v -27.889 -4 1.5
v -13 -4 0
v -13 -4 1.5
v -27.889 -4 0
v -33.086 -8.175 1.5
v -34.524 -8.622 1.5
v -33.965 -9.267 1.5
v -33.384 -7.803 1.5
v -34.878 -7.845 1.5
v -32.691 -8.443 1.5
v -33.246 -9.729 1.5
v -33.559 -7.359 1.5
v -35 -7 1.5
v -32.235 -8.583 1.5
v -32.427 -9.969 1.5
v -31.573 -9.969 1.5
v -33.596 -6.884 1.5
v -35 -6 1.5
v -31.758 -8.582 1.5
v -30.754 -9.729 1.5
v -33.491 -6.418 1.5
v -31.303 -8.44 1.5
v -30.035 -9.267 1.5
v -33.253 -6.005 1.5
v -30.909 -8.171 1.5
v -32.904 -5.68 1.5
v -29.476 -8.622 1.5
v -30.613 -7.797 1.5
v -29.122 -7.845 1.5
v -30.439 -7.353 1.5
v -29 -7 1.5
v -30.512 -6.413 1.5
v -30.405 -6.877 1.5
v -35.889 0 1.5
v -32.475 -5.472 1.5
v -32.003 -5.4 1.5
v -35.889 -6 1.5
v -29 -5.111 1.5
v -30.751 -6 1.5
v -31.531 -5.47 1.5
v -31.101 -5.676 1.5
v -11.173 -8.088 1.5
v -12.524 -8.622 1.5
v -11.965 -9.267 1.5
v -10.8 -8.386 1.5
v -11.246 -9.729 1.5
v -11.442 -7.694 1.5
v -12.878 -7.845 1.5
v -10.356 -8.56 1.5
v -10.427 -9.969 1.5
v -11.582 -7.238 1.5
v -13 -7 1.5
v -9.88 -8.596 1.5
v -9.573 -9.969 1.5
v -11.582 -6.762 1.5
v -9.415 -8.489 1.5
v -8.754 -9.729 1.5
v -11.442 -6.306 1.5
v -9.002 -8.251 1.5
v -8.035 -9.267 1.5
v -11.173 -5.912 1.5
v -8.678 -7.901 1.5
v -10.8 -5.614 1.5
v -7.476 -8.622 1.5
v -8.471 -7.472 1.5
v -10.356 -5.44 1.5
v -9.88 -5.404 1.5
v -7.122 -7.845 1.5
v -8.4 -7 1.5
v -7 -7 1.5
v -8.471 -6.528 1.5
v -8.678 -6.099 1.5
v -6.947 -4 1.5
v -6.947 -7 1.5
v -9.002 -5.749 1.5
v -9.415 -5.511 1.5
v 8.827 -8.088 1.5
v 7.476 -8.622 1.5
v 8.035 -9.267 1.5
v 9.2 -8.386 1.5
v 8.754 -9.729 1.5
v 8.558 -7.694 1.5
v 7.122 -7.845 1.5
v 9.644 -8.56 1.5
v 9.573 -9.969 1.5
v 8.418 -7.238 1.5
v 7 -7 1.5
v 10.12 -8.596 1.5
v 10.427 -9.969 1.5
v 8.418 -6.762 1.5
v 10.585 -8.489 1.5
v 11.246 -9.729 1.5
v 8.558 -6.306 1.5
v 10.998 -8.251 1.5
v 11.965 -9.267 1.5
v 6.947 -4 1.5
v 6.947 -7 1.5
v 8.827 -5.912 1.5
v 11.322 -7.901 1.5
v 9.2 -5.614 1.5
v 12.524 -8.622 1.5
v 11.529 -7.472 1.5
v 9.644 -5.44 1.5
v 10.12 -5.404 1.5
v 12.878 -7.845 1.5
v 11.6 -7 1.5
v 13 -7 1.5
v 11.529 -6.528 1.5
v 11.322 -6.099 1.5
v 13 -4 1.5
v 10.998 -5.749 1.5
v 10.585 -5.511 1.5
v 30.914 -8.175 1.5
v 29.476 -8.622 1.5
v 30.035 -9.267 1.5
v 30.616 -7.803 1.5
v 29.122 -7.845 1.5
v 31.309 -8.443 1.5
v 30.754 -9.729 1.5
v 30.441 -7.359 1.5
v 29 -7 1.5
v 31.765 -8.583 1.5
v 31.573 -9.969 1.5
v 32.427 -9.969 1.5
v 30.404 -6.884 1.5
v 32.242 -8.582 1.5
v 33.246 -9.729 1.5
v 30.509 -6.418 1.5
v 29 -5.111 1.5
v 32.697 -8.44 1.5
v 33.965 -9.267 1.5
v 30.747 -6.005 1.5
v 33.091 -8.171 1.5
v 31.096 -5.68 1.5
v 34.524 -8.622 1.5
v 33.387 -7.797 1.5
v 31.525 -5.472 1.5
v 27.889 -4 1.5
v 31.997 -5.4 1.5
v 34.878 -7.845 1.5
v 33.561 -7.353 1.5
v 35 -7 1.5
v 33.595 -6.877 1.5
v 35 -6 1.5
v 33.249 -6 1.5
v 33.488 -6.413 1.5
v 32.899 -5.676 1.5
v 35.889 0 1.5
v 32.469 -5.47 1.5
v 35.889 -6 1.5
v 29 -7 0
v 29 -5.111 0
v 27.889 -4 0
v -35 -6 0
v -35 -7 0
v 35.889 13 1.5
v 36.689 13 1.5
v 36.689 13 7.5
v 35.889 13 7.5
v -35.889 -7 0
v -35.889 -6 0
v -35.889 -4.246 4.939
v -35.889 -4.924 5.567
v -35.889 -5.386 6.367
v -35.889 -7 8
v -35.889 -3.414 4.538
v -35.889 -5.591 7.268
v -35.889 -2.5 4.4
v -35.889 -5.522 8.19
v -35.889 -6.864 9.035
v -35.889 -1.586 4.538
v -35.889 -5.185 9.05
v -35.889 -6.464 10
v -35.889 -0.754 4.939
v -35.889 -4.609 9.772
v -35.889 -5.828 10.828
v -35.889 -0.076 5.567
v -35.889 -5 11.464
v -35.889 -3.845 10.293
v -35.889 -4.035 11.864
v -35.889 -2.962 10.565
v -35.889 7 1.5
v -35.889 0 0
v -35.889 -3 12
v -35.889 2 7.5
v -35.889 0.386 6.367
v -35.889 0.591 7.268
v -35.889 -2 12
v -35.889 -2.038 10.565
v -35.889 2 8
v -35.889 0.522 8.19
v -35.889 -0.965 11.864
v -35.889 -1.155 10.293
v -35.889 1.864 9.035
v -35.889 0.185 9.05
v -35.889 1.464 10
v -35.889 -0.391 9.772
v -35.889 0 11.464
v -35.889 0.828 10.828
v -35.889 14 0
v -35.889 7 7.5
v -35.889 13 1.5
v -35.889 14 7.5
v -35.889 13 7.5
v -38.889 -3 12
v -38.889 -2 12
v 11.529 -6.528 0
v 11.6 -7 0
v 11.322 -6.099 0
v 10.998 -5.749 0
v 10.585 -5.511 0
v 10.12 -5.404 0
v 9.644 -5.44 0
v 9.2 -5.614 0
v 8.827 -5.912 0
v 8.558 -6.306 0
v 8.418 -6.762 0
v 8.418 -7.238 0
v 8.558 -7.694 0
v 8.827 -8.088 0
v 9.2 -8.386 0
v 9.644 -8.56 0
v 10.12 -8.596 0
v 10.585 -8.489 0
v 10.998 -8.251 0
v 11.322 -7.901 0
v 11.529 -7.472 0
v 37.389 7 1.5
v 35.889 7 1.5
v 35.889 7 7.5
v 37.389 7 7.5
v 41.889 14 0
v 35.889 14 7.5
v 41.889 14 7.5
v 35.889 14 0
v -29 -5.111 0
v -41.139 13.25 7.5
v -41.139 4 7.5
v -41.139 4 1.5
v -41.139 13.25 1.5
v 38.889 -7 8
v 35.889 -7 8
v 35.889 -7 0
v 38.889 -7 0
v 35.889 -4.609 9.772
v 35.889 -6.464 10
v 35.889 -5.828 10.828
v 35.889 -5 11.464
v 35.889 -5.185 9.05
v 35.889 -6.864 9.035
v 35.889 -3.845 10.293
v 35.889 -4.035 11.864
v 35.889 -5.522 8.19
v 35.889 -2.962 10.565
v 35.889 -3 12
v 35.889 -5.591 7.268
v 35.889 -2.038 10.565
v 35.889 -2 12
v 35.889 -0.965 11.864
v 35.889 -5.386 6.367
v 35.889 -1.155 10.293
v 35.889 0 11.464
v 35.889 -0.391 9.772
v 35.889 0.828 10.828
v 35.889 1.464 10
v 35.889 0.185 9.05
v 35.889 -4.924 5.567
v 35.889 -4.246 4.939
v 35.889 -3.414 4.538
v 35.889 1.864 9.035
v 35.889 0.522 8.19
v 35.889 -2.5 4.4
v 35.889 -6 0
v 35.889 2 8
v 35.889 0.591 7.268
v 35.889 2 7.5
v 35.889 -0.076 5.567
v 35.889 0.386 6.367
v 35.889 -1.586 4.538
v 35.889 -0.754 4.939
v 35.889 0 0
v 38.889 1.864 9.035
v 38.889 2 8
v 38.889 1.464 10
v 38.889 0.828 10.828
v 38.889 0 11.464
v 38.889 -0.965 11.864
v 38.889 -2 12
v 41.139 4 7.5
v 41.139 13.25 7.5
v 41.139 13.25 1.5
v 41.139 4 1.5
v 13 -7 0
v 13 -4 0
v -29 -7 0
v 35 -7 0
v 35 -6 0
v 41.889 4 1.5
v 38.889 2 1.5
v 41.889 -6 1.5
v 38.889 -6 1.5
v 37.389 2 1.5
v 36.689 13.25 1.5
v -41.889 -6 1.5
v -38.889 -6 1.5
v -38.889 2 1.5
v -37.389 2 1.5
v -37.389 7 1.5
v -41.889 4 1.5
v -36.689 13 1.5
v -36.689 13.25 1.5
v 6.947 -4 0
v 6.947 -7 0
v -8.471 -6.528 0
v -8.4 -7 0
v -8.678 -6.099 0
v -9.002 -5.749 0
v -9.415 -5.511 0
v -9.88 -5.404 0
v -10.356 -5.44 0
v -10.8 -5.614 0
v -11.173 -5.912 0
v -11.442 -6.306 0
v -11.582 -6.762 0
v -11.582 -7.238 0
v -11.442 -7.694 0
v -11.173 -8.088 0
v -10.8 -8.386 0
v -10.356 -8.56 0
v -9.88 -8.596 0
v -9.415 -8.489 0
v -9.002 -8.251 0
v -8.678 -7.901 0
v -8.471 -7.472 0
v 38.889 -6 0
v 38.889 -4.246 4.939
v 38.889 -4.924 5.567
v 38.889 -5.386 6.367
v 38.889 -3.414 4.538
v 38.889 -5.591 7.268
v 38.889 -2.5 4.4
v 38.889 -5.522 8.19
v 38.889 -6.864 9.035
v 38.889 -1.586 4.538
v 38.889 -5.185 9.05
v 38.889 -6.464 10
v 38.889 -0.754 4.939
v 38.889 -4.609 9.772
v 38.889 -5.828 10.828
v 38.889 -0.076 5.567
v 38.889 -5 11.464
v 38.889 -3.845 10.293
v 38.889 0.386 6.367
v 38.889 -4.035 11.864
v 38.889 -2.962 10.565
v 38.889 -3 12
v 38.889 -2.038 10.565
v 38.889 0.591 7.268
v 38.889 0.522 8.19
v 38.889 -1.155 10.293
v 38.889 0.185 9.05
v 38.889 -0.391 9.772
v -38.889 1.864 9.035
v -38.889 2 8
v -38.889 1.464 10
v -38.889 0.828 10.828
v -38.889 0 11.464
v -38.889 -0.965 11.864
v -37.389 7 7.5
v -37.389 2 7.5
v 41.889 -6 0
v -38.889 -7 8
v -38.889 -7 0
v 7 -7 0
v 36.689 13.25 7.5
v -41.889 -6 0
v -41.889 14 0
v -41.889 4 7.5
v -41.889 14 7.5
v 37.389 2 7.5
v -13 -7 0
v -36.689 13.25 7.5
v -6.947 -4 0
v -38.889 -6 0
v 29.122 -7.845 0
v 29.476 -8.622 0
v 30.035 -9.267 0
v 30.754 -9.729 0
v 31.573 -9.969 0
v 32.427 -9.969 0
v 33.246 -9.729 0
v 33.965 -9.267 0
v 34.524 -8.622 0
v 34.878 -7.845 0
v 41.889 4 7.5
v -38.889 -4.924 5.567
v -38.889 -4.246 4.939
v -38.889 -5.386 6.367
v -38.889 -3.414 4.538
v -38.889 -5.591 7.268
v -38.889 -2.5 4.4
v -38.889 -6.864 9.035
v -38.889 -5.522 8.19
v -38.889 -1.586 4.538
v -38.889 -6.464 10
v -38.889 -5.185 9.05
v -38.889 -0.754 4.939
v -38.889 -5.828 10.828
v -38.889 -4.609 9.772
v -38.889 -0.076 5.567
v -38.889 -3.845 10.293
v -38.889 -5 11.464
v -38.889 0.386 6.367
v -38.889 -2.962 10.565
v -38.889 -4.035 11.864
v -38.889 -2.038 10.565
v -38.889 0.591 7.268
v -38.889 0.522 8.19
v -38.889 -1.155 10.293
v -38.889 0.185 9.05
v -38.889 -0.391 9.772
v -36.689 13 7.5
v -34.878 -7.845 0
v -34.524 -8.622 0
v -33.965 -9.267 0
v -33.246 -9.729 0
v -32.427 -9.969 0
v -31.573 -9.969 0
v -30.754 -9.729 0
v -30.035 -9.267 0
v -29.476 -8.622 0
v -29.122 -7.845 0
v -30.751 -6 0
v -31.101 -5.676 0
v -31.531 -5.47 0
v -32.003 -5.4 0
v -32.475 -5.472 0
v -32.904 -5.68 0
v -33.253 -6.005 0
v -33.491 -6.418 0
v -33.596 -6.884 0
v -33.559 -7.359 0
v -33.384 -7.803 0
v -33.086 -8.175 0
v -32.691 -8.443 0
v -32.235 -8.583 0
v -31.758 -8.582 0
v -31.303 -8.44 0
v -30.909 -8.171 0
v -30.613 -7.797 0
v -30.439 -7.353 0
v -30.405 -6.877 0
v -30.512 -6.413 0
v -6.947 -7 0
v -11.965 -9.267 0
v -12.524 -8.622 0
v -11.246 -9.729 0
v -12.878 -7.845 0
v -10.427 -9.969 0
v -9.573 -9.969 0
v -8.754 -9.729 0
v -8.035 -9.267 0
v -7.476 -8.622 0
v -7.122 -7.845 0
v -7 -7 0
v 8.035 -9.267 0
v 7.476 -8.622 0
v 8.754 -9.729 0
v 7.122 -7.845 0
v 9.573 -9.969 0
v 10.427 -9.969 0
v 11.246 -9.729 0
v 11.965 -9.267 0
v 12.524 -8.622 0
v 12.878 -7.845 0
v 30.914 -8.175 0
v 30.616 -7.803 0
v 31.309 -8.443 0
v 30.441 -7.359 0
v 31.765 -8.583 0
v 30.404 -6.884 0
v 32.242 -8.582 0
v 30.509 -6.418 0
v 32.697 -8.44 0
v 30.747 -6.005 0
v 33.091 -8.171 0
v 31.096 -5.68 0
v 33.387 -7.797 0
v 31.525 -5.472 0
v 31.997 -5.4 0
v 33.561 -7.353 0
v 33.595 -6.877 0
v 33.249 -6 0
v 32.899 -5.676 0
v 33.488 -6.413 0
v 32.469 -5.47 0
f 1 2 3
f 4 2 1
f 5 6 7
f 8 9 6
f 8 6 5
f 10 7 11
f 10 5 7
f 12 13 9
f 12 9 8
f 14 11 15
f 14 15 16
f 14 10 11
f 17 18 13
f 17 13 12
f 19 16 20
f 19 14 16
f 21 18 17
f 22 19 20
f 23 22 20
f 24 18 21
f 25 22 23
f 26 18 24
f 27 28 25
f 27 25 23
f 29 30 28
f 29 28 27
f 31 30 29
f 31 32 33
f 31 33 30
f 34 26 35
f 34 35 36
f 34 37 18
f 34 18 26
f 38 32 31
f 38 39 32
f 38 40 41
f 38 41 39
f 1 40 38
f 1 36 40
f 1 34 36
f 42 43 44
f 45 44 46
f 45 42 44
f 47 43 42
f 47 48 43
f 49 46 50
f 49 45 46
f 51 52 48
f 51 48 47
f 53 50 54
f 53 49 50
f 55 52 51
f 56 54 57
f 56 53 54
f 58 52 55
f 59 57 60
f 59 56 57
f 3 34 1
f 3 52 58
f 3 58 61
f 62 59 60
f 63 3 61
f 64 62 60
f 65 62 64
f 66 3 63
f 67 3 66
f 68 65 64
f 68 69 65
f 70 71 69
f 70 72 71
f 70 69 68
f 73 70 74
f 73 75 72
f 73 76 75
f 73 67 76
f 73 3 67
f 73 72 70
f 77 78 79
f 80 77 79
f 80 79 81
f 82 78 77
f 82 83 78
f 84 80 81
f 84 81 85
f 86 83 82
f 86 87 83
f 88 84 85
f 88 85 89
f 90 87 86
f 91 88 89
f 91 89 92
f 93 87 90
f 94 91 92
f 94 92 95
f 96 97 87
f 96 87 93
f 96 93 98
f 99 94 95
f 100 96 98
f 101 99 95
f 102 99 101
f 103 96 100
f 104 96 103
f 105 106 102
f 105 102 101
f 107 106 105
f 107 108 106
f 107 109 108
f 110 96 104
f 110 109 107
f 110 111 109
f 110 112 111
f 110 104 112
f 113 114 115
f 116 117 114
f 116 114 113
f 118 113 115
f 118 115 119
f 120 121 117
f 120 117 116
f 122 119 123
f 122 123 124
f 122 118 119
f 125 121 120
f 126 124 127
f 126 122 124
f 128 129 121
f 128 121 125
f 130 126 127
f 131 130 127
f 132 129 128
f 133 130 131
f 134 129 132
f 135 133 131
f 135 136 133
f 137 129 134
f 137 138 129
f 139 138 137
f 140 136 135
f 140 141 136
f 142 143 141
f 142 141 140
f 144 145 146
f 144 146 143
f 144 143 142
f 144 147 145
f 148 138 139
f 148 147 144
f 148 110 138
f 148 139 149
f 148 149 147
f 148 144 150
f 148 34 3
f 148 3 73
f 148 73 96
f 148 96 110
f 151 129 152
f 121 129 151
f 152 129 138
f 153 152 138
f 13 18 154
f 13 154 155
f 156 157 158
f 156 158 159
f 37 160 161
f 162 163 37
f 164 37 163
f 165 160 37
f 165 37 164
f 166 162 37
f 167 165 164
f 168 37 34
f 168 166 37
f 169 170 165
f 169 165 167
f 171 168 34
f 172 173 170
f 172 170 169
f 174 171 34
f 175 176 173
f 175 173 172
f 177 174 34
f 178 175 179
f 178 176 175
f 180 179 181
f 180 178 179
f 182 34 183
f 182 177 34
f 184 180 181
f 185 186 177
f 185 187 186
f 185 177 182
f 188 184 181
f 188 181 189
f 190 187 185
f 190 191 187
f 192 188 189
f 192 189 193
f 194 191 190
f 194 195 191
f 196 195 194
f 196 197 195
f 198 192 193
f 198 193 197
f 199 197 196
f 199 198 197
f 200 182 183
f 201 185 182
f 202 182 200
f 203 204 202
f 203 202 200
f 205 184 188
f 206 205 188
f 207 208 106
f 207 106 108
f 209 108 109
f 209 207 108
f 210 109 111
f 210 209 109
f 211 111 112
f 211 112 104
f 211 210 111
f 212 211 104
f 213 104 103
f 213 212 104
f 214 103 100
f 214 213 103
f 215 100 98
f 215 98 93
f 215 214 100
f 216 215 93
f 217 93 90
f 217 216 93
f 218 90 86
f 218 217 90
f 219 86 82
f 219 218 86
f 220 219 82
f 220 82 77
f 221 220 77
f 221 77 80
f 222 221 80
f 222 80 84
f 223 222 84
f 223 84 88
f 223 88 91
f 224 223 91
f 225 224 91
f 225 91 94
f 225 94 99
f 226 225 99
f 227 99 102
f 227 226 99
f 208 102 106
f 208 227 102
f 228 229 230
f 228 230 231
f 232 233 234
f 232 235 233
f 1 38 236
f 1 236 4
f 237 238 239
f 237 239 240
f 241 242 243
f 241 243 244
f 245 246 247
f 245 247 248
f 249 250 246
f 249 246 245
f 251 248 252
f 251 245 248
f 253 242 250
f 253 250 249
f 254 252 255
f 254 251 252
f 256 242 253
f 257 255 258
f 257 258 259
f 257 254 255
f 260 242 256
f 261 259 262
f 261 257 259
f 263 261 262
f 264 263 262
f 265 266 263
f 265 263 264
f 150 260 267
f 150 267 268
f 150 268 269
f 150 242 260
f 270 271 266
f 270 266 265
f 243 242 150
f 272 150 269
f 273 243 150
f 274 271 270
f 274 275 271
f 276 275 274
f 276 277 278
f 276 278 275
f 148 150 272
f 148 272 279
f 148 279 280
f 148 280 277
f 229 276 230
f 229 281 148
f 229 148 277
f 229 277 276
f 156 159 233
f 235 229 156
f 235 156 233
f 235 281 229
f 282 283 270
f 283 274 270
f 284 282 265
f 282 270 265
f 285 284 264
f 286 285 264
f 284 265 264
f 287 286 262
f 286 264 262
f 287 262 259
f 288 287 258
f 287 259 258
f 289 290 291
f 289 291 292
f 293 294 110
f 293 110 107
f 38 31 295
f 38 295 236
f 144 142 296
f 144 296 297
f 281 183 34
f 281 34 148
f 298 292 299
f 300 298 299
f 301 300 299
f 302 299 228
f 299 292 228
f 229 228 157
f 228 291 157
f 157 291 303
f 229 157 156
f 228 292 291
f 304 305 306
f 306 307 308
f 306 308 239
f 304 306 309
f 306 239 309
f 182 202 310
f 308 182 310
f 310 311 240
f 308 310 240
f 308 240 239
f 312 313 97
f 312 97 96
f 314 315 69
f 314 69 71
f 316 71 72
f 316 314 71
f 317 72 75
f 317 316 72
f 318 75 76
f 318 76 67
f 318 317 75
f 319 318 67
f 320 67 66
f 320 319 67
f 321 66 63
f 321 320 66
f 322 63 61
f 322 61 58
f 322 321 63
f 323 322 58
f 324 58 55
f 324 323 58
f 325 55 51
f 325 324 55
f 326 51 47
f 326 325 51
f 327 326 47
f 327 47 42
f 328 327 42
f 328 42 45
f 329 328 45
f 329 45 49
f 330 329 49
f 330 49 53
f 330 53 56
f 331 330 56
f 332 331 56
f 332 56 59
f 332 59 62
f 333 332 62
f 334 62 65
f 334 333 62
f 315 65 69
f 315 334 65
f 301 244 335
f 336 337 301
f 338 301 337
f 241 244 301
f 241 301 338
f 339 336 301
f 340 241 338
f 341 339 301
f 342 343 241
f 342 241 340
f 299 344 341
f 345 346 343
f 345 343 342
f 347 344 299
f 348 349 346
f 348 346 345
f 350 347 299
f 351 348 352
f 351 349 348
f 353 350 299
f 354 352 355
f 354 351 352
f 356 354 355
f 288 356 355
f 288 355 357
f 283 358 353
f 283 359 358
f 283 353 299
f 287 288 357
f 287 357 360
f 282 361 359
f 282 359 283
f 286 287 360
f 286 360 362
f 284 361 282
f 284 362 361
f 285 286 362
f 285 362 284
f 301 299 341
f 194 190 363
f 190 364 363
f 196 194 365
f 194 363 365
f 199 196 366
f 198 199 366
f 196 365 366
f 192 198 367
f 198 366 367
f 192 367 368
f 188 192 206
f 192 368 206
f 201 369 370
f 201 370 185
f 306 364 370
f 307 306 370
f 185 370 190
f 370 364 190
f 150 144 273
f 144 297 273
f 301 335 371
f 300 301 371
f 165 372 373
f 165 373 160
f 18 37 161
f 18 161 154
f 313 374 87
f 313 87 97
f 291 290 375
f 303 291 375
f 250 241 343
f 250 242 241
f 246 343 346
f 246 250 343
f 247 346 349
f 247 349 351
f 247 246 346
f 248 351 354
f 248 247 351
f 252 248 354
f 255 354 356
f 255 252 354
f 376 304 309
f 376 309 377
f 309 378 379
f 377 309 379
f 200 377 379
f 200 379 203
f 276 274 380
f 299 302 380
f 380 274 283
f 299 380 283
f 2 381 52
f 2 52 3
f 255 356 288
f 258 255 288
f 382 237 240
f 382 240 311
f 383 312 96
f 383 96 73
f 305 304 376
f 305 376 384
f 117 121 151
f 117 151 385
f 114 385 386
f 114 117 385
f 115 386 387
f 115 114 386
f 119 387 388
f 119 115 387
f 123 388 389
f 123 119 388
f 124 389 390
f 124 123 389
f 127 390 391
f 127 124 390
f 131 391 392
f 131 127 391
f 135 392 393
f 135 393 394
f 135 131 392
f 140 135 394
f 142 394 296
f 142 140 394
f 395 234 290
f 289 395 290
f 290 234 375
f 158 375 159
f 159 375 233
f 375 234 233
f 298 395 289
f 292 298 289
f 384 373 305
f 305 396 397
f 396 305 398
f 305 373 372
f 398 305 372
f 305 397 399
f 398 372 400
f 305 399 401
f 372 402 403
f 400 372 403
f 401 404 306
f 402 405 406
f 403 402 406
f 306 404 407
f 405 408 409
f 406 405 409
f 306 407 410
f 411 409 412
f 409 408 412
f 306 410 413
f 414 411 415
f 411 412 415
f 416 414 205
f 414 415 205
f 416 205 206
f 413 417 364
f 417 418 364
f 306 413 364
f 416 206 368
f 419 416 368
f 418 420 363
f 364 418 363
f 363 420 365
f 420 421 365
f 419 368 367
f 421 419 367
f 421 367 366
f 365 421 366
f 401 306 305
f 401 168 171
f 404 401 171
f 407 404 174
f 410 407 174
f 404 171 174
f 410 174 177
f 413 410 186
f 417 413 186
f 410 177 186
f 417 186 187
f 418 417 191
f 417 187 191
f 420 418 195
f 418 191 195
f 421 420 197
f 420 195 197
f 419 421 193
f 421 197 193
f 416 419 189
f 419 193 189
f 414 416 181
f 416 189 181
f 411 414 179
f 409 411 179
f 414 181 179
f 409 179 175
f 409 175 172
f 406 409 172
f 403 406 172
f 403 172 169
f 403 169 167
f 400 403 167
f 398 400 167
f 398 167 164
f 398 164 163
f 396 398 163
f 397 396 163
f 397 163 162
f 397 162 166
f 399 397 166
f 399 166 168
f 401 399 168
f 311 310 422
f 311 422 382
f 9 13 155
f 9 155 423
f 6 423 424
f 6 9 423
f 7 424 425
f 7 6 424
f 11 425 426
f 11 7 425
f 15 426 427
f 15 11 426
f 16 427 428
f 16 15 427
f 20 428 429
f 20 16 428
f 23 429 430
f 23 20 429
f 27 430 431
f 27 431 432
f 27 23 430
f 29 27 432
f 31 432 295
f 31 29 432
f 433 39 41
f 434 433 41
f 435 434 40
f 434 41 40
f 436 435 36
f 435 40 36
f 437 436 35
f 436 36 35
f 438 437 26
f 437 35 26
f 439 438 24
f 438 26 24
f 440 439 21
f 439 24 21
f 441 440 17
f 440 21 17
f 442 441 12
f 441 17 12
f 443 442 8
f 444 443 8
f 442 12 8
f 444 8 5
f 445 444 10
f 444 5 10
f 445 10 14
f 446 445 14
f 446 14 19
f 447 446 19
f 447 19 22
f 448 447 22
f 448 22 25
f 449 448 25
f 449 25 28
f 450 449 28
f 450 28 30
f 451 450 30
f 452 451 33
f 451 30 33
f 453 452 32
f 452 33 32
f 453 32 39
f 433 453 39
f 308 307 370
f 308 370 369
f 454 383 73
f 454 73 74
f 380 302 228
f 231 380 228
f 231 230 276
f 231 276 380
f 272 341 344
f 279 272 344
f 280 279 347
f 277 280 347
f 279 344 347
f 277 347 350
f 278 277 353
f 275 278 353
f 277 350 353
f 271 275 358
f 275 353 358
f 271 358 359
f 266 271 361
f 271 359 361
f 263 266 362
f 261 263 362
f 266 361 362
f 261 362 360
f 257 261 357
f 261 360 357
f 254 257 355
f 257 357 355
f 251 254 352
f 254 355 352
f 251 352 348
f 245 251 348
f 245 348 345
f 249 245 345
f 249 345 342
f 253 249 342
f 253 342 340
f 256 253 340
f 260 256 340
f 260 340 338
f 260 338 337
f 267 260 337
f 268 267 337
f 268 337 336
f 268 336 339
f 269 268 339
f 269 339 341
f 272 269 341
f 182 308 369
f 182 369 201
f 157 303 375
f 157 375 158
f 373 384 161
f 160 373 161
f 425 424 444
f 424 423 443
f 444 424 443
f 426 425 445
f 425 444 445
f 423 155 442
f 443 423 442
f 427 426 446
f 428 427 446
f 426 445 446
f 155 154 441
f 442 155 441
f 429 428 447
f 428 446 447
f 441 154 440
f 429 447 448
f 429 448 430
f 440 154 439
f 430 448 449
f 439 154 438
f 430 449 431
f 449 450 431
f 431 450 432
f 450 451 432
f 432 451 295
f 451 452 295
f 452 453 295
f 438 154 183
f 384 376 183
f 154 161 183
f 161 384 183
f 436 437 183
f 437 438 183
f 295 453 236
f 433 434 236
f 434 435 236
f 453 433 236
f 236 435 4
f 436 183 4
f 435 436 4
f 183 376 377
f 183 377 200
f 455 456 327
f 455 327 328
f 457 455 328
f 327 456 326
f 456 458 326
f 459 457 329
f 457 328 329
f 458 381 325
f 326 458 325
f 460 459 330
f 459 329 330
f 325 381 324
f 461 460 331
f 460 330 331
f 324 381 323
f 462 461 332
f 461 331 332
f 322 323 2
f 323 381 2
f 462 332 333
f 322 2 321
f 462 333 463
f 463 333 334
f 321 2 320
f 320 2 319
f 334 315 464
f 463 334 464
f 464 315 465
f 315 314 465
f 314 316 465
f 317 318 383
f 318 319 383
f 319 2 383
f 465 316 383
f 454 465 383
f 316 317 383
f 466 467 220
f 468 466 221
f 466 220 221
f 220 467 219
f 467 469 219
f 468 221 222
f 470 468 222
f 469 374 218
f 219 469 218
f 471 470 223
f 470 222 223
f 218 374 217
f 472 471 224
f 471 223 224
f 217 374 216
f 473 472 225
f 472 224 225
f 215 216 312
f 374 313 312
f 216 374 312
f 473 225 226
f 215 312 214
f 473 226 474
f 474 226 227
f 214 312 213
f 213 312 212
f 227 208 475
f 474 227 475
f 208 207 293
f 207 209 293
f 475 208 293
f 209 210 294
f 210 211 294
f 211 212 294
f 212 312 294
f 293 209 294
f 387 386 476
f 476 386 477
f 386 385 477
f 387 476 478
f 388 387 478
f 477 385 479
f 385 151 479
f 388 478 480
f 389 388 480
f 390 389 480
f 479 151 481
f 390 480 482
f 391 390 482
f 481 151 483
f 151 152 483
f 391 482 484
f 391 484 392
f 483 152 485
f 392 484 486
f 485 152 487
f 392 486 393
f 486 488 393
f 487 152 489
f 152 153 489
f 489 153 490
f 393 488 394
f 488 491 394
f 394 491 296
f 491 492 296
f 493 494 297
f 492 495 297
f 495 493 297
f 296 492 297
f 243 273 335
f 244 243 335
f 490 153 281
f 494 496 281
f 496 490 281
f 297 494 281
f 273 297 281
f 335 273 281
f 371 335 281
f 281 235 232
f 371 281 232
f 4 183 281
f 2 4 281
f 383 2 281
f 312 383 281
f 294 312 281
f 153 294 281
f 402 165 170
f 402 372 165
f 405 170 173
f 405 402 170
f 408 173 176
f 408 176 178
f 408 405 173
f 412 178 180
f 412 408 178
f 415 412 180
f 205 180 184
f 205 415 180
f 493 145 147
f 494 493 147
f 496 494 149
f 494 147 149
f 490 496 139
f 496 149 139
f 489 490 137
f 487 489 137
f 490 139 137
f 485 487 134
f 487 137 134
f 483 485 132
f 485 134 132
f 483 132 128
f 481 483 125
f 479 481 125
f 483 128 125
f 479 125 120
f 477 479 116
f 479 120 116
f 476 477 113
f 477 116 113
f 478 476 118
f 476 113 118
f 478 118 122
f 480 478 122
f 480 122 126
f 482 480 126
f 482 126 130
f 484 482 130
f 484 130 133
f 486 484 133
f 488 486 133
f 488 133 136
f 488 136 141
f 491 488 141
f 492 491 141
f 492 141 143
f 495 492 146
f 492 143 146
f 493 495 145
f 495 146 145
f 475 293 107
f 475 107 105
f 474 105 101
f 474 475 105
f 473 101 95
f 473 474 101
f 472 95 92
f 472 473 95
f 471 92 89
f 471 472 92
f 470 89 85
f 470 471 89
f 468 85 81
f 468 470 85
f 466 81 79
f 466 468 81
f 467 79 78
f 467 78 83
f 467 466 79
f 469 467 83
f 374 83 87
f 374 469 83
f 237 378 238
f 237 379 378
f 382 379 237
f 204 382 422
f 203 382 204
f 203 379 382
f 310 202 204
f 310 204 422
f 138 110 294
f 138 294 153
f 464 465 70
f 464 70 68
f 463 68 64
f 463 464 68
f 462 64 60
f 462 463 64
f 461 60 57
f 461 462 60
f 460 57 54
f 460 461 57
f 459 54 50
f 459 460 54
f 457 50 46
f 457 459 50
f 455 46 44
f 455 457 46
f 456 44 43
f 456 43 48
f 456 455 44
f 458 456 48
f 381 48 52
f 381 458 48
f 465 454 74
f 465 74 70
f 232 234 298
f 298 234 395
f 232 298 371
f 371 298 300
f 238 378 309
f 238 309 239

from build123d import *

# Parameters (mm, degrees)
SKETCH1_R            = 1.6
BOSS_EXTRUDE1_DEPTH  = 1.5
SKETCH2_W            = 1
SKETCH2_H            = 18
BOSS_EXTRUDE2_DEPTH  = 1.5
BOSS_EXTRUDE3_DEPTH  = 6
BOSS_EXTRUDE4_DEPTH  = 6
SKETCH5_W            = 1.5
SKETCH5_H            = 7
BOSS_EXTRUDE5_DEPTH  = 6
BOSS_EXTRUDE6_DEPTH  = 1.5
SKETCH7_W            = 3
SKETCH7_H            = 6
BOSS_EXTRUDE7_DEPTH  = 12
SKETCH8_W            = 3
SKETCH8_H            = 9
BOSS_EXTRUDE8_DEPTH  = 13.5
SKETCH10_W           = 3
SKETCH10_H           = 2
CUT_EXTRUDE2_DEPTH   = 141
SKETCH11_W           = 3
SKETCH11_H           = 2
BOSS_EXTRUDE9_DEPTH  = 12
SKETCH12_R           = 3.1
SKETCH12_W           = 1.5
SKETCH12_H           = 9
CUT_EXTRUDE6_DEPTH   = 86
FILLET4_R            = 4
SKETCH13_R           = 1.6
BOSS_EXTRUDE10_DEPTH = 1.5
SKETCH14_R           = 1.6
CUT_EXTRUDE7_DEPTH   = 1.5


with BuildPart() as part:
    # Sketch1 → Boss-Extrude1 (new body)
    with BuildSketch(Plane.XY):
        with BuildLine():
            Line((-35.88879481, 0), (35.88879481, 0))
            Line((35.88879481, 0), (35.88879481, 14))
            Line((35.88879481, 14), (40.88879481, 14))
            Line((40.88879481, 14), (40.88879481, -4))
            Line((40.88879481, -4), (35.88879481, -4))
            Line((35.88879481, -4), (13, -4))
            Line((13, -4), (13, -7))
            ThreePointArc((13, -7), (10, -10), (7, -7))
            Line((7, -7), (6.947208763, -7))
            Line((6.947208763, -7), (6.947208763, -4))
            Line((6.947208763, -4), (-6.947208763, -4))
            Line((-6.947208763, -4), (-6.947208763, -7))
            Line((-6.947208763, -7), (-7, -7))
            ThreePointArc((-7, -7), (-10, -10), (-13, -7))
            Line((-13, -7), (-13, -4))
            Line((-13, -4), (-35.88879481, -4))
            Line((-35.88879481, -4), (-40.88879481, -4))
            Line((-40.88879481, -4), (-40.88879481, 14))
            Line((-40.88879481, 14), (-35.88879481, 14))
            Line((-35.88879481, 14), (-35.88879481, 0))
        make_face()
        with Locations((10, -7)):
            Circle(SKETCH1_R, mode=Mode.SUBTRACT)
        with Locations((-10, -7)):
            Circle(SKETCH1_R, mode=Mode.SUBTRACT)
    extrude(amount=BOSS_EXTRUDE1_DEPTH)

    # Sketch2 → Boss-Extrude2 (add)
    with BuildSketch(Plane.XY.offset(1.5)):
        with Locations((41.38879481, 5)):
            Rectangle(SKETCH2_W, SKETCH2_H)
        with Locations((-41.38879481, 5)):
            Rectangle(SKETCH2_W, SKETCH2_H)
    extrude(amount=-BOSS_EXTRUDE2_DEPTH)

    # Sketch3 → Boss-Extrude3 (add)
    with BuildSketch(Plane.XY.offset(1.5)):
        Polygon((35.88879481, 14), (41.88879481, 14), (41.88879481, 4), (41.38879481, 4), (41.38879481, 13.5), (36.68879481, 13.5), (36.68879481, 13), (35.88879481, 13), align=None)
        Polygon((-36.68879481, 13.5), (-41.38879481, 13.5), (-41.38879481, 4), (-41.88879481, 4), (-41.88879481, 14), (-35.88879481, 14), (-35.88879481, 13), (-36.68879481, 13), align=None)
    extrude(amount=BOSS_EXTRUDE3_DEPTH)

    # Sketch4 → Boss-Extrude4 (add)
    with BuildSketch(Plane.XY.offset(7.5)):
        Polygon((-41.38879481, 4), (-41.13879481, 4), (-41.13879481, 13.12888012), (-41.13879481, 13.25), (-36.68879481, 13.25), (-36.68879481, 13.5), (-41.38879481, 13.5), align=None)
        Polygon((41.38879481, 13.5), (41.38879481, 4), (41.13879481, 4), (41.13879481, 13.12888012), (41.13879481, 13.25), (36.68879481, 13.25), (36.68879481, 13.5), align=None)
    extrude(amount=-BOSS_EXTRUDE4_DEPTH)

    # Sketch5 → Boss-Extrude5 (add)
    with BuildSketch(Plane.XY.offset(1.5)):
        with Locations((-36.63879481, 3.5)):
            Rectangle(SKETCH5_W, SKETCH5_H)
        with Locations((36.63879481, 3.5)):
            Rectangle(SKETCH5_W, SKETCH5_H)
    extrude(amount=BOSS_EXTRUDE5_DEPTH)

    # Sketch6 → Boss-Extrude6 (add)
    with BuildSketch(Plane.XY.offset(1.5)):
        Polygon((41.88879481, -4), (41.88879481, -6), (29.88879481, -6), (27.88879481, -4), align=None)
        Polygon((-27.88879481, -4), (-41.88879481, -4), (-41.88879481, -6), (-29.88879481, -6), align=None)
    extrude(amount=-BOSS_EXTRUDE6_DEPTH)

    # Sketch7 → Boss-Extrude7 (add)
    with BuildSketch(Plane.XY.offset(1.5)):
        with Locations((37.38879481, -3)):
            Rectangle(SKETCH7_W, SKETCH7_H)
        with Locations((-37.38879481, -3)):
            Rectangle(SKETCH7_W, SKETCH7_H)
    extrude(amount=BOSS_EXTRUDE7_DEPTH)

    # Sketch8 → Boss-Extrude8 (add)
    with BuildSketch(Plane.XY.offset(13.5)):
        with Locations((-37.38879481, -4.5)):
            Rectangle(SKETCH8_W, SKETCH8_H)
        with Locations((37.38879481, -4.5)):
            Rectangle(SKETCH8_W, SKETCH8_H)
    extrude(amount=-BOSS_EXTRUDE8_DEPTH)

    # Sketch10 → Cut-Extrude2 (cut)
    with BuildSketch(Plane.XY.offset(13.5)):
        with Locations((-37.38879481, -8)):
            Rectangle(SKETCH10_W, SKETCH10_H)
        with Locations((37.38879481, -8)):
            Rectangle(SKETCH10_W, SKETCH10_H)
    extrude(amount=-CUT_EXTRUDE2_DEPTH, mode=Mode.SUBTRACT)

    # Sketch11 → Boss-Extrude9 (add)
    with BuildSketch(Plane.XY.offset(13.5)):
        with Locations((-37.38879481, 1)):
            Rectangle(SKETCH11_W, SKETCH11_H)
        with Locations((37.38879481, 1)):
            Rectangle(SKETCH11_W, SKETCH11_H)
    extrude(amount=-BOSS_EXTRUDE9_DEPTH)

    # Sketch12 → Cut-Extrude6 (cut)
    with BuildSketch(Plane(origin=(38.88879481, 0, 0), x_dir=(0, 0, -1), z_dir=(1, 0, 0))):
        with Locations((-7.5, -2.5)):
            Circle(SKETCH12_R)
        with Locations((-12.75, -2.5)):
            Rectangle(SKETCH12_W, SKETCH12_H)
    extrude(amount=-CUT_EXTRUDE6_DEPTH, mode=Mode.SUBTRACT)

    # Fillet4
    fillet4_edges = [part.edges().sort_by_distance(p)[0] for p in [
        (37.38879481, 2, 12),
        (37.38879481, -7, 12),
        (-37.38879481, -7, 12),
        (-37.38879481, 2, 12),
    ]]
    fillet(fillet4_edges, radius=FILLET4_R)

    # Sketch13 → Boss-Extrude10 (add)
    with BuildSketch(Plane.XY.offset(1.5)):
        with BuildLine():
            Line((-29, -7), (-29, -2.59629788))
            Line((-29, -2.59629788), (-35, -2.59629788))
            Line((-35, -2.59629788), (-35, -7))
            ThreePointArc((-35, -7), (-32, -10), (-29, -7))
        make_face()
        with Locations((-32, -7)):
            Circle(SKETCH13_R, mode=Mode.SUBTRACT)
        with BuildLine():
            Line((35, -2.59629788), (29, -2.59629788))
            Line((29, -2.59629788), (29, -7))
            ThreePointArc((29, -7), (32, -10), (35, -7))
            Line((35, -7), (35, -2.59629788))
        make_face()
        with Locations((32, -7)):
            Circle(SKETCH13_R, mode=Mode.SUBTRACT)
    extrude(amount=-BOSS_EXTRUDE10_DEPTH)

    # Sketch14 → Cut-Extrude7 (cut)
    with BuildSketch(Plane.XY.offset(1.5)):
        with Locations((-32, -7)):
            Circle(SKETCH14_R)
        with Locations((32, -7)):
            Circle(SKETCH14_R)
    extrude(amount=-CUT_EXTRUDE7_DEPTH, mode=Mode.SUBTRACT)


solid = part.part
